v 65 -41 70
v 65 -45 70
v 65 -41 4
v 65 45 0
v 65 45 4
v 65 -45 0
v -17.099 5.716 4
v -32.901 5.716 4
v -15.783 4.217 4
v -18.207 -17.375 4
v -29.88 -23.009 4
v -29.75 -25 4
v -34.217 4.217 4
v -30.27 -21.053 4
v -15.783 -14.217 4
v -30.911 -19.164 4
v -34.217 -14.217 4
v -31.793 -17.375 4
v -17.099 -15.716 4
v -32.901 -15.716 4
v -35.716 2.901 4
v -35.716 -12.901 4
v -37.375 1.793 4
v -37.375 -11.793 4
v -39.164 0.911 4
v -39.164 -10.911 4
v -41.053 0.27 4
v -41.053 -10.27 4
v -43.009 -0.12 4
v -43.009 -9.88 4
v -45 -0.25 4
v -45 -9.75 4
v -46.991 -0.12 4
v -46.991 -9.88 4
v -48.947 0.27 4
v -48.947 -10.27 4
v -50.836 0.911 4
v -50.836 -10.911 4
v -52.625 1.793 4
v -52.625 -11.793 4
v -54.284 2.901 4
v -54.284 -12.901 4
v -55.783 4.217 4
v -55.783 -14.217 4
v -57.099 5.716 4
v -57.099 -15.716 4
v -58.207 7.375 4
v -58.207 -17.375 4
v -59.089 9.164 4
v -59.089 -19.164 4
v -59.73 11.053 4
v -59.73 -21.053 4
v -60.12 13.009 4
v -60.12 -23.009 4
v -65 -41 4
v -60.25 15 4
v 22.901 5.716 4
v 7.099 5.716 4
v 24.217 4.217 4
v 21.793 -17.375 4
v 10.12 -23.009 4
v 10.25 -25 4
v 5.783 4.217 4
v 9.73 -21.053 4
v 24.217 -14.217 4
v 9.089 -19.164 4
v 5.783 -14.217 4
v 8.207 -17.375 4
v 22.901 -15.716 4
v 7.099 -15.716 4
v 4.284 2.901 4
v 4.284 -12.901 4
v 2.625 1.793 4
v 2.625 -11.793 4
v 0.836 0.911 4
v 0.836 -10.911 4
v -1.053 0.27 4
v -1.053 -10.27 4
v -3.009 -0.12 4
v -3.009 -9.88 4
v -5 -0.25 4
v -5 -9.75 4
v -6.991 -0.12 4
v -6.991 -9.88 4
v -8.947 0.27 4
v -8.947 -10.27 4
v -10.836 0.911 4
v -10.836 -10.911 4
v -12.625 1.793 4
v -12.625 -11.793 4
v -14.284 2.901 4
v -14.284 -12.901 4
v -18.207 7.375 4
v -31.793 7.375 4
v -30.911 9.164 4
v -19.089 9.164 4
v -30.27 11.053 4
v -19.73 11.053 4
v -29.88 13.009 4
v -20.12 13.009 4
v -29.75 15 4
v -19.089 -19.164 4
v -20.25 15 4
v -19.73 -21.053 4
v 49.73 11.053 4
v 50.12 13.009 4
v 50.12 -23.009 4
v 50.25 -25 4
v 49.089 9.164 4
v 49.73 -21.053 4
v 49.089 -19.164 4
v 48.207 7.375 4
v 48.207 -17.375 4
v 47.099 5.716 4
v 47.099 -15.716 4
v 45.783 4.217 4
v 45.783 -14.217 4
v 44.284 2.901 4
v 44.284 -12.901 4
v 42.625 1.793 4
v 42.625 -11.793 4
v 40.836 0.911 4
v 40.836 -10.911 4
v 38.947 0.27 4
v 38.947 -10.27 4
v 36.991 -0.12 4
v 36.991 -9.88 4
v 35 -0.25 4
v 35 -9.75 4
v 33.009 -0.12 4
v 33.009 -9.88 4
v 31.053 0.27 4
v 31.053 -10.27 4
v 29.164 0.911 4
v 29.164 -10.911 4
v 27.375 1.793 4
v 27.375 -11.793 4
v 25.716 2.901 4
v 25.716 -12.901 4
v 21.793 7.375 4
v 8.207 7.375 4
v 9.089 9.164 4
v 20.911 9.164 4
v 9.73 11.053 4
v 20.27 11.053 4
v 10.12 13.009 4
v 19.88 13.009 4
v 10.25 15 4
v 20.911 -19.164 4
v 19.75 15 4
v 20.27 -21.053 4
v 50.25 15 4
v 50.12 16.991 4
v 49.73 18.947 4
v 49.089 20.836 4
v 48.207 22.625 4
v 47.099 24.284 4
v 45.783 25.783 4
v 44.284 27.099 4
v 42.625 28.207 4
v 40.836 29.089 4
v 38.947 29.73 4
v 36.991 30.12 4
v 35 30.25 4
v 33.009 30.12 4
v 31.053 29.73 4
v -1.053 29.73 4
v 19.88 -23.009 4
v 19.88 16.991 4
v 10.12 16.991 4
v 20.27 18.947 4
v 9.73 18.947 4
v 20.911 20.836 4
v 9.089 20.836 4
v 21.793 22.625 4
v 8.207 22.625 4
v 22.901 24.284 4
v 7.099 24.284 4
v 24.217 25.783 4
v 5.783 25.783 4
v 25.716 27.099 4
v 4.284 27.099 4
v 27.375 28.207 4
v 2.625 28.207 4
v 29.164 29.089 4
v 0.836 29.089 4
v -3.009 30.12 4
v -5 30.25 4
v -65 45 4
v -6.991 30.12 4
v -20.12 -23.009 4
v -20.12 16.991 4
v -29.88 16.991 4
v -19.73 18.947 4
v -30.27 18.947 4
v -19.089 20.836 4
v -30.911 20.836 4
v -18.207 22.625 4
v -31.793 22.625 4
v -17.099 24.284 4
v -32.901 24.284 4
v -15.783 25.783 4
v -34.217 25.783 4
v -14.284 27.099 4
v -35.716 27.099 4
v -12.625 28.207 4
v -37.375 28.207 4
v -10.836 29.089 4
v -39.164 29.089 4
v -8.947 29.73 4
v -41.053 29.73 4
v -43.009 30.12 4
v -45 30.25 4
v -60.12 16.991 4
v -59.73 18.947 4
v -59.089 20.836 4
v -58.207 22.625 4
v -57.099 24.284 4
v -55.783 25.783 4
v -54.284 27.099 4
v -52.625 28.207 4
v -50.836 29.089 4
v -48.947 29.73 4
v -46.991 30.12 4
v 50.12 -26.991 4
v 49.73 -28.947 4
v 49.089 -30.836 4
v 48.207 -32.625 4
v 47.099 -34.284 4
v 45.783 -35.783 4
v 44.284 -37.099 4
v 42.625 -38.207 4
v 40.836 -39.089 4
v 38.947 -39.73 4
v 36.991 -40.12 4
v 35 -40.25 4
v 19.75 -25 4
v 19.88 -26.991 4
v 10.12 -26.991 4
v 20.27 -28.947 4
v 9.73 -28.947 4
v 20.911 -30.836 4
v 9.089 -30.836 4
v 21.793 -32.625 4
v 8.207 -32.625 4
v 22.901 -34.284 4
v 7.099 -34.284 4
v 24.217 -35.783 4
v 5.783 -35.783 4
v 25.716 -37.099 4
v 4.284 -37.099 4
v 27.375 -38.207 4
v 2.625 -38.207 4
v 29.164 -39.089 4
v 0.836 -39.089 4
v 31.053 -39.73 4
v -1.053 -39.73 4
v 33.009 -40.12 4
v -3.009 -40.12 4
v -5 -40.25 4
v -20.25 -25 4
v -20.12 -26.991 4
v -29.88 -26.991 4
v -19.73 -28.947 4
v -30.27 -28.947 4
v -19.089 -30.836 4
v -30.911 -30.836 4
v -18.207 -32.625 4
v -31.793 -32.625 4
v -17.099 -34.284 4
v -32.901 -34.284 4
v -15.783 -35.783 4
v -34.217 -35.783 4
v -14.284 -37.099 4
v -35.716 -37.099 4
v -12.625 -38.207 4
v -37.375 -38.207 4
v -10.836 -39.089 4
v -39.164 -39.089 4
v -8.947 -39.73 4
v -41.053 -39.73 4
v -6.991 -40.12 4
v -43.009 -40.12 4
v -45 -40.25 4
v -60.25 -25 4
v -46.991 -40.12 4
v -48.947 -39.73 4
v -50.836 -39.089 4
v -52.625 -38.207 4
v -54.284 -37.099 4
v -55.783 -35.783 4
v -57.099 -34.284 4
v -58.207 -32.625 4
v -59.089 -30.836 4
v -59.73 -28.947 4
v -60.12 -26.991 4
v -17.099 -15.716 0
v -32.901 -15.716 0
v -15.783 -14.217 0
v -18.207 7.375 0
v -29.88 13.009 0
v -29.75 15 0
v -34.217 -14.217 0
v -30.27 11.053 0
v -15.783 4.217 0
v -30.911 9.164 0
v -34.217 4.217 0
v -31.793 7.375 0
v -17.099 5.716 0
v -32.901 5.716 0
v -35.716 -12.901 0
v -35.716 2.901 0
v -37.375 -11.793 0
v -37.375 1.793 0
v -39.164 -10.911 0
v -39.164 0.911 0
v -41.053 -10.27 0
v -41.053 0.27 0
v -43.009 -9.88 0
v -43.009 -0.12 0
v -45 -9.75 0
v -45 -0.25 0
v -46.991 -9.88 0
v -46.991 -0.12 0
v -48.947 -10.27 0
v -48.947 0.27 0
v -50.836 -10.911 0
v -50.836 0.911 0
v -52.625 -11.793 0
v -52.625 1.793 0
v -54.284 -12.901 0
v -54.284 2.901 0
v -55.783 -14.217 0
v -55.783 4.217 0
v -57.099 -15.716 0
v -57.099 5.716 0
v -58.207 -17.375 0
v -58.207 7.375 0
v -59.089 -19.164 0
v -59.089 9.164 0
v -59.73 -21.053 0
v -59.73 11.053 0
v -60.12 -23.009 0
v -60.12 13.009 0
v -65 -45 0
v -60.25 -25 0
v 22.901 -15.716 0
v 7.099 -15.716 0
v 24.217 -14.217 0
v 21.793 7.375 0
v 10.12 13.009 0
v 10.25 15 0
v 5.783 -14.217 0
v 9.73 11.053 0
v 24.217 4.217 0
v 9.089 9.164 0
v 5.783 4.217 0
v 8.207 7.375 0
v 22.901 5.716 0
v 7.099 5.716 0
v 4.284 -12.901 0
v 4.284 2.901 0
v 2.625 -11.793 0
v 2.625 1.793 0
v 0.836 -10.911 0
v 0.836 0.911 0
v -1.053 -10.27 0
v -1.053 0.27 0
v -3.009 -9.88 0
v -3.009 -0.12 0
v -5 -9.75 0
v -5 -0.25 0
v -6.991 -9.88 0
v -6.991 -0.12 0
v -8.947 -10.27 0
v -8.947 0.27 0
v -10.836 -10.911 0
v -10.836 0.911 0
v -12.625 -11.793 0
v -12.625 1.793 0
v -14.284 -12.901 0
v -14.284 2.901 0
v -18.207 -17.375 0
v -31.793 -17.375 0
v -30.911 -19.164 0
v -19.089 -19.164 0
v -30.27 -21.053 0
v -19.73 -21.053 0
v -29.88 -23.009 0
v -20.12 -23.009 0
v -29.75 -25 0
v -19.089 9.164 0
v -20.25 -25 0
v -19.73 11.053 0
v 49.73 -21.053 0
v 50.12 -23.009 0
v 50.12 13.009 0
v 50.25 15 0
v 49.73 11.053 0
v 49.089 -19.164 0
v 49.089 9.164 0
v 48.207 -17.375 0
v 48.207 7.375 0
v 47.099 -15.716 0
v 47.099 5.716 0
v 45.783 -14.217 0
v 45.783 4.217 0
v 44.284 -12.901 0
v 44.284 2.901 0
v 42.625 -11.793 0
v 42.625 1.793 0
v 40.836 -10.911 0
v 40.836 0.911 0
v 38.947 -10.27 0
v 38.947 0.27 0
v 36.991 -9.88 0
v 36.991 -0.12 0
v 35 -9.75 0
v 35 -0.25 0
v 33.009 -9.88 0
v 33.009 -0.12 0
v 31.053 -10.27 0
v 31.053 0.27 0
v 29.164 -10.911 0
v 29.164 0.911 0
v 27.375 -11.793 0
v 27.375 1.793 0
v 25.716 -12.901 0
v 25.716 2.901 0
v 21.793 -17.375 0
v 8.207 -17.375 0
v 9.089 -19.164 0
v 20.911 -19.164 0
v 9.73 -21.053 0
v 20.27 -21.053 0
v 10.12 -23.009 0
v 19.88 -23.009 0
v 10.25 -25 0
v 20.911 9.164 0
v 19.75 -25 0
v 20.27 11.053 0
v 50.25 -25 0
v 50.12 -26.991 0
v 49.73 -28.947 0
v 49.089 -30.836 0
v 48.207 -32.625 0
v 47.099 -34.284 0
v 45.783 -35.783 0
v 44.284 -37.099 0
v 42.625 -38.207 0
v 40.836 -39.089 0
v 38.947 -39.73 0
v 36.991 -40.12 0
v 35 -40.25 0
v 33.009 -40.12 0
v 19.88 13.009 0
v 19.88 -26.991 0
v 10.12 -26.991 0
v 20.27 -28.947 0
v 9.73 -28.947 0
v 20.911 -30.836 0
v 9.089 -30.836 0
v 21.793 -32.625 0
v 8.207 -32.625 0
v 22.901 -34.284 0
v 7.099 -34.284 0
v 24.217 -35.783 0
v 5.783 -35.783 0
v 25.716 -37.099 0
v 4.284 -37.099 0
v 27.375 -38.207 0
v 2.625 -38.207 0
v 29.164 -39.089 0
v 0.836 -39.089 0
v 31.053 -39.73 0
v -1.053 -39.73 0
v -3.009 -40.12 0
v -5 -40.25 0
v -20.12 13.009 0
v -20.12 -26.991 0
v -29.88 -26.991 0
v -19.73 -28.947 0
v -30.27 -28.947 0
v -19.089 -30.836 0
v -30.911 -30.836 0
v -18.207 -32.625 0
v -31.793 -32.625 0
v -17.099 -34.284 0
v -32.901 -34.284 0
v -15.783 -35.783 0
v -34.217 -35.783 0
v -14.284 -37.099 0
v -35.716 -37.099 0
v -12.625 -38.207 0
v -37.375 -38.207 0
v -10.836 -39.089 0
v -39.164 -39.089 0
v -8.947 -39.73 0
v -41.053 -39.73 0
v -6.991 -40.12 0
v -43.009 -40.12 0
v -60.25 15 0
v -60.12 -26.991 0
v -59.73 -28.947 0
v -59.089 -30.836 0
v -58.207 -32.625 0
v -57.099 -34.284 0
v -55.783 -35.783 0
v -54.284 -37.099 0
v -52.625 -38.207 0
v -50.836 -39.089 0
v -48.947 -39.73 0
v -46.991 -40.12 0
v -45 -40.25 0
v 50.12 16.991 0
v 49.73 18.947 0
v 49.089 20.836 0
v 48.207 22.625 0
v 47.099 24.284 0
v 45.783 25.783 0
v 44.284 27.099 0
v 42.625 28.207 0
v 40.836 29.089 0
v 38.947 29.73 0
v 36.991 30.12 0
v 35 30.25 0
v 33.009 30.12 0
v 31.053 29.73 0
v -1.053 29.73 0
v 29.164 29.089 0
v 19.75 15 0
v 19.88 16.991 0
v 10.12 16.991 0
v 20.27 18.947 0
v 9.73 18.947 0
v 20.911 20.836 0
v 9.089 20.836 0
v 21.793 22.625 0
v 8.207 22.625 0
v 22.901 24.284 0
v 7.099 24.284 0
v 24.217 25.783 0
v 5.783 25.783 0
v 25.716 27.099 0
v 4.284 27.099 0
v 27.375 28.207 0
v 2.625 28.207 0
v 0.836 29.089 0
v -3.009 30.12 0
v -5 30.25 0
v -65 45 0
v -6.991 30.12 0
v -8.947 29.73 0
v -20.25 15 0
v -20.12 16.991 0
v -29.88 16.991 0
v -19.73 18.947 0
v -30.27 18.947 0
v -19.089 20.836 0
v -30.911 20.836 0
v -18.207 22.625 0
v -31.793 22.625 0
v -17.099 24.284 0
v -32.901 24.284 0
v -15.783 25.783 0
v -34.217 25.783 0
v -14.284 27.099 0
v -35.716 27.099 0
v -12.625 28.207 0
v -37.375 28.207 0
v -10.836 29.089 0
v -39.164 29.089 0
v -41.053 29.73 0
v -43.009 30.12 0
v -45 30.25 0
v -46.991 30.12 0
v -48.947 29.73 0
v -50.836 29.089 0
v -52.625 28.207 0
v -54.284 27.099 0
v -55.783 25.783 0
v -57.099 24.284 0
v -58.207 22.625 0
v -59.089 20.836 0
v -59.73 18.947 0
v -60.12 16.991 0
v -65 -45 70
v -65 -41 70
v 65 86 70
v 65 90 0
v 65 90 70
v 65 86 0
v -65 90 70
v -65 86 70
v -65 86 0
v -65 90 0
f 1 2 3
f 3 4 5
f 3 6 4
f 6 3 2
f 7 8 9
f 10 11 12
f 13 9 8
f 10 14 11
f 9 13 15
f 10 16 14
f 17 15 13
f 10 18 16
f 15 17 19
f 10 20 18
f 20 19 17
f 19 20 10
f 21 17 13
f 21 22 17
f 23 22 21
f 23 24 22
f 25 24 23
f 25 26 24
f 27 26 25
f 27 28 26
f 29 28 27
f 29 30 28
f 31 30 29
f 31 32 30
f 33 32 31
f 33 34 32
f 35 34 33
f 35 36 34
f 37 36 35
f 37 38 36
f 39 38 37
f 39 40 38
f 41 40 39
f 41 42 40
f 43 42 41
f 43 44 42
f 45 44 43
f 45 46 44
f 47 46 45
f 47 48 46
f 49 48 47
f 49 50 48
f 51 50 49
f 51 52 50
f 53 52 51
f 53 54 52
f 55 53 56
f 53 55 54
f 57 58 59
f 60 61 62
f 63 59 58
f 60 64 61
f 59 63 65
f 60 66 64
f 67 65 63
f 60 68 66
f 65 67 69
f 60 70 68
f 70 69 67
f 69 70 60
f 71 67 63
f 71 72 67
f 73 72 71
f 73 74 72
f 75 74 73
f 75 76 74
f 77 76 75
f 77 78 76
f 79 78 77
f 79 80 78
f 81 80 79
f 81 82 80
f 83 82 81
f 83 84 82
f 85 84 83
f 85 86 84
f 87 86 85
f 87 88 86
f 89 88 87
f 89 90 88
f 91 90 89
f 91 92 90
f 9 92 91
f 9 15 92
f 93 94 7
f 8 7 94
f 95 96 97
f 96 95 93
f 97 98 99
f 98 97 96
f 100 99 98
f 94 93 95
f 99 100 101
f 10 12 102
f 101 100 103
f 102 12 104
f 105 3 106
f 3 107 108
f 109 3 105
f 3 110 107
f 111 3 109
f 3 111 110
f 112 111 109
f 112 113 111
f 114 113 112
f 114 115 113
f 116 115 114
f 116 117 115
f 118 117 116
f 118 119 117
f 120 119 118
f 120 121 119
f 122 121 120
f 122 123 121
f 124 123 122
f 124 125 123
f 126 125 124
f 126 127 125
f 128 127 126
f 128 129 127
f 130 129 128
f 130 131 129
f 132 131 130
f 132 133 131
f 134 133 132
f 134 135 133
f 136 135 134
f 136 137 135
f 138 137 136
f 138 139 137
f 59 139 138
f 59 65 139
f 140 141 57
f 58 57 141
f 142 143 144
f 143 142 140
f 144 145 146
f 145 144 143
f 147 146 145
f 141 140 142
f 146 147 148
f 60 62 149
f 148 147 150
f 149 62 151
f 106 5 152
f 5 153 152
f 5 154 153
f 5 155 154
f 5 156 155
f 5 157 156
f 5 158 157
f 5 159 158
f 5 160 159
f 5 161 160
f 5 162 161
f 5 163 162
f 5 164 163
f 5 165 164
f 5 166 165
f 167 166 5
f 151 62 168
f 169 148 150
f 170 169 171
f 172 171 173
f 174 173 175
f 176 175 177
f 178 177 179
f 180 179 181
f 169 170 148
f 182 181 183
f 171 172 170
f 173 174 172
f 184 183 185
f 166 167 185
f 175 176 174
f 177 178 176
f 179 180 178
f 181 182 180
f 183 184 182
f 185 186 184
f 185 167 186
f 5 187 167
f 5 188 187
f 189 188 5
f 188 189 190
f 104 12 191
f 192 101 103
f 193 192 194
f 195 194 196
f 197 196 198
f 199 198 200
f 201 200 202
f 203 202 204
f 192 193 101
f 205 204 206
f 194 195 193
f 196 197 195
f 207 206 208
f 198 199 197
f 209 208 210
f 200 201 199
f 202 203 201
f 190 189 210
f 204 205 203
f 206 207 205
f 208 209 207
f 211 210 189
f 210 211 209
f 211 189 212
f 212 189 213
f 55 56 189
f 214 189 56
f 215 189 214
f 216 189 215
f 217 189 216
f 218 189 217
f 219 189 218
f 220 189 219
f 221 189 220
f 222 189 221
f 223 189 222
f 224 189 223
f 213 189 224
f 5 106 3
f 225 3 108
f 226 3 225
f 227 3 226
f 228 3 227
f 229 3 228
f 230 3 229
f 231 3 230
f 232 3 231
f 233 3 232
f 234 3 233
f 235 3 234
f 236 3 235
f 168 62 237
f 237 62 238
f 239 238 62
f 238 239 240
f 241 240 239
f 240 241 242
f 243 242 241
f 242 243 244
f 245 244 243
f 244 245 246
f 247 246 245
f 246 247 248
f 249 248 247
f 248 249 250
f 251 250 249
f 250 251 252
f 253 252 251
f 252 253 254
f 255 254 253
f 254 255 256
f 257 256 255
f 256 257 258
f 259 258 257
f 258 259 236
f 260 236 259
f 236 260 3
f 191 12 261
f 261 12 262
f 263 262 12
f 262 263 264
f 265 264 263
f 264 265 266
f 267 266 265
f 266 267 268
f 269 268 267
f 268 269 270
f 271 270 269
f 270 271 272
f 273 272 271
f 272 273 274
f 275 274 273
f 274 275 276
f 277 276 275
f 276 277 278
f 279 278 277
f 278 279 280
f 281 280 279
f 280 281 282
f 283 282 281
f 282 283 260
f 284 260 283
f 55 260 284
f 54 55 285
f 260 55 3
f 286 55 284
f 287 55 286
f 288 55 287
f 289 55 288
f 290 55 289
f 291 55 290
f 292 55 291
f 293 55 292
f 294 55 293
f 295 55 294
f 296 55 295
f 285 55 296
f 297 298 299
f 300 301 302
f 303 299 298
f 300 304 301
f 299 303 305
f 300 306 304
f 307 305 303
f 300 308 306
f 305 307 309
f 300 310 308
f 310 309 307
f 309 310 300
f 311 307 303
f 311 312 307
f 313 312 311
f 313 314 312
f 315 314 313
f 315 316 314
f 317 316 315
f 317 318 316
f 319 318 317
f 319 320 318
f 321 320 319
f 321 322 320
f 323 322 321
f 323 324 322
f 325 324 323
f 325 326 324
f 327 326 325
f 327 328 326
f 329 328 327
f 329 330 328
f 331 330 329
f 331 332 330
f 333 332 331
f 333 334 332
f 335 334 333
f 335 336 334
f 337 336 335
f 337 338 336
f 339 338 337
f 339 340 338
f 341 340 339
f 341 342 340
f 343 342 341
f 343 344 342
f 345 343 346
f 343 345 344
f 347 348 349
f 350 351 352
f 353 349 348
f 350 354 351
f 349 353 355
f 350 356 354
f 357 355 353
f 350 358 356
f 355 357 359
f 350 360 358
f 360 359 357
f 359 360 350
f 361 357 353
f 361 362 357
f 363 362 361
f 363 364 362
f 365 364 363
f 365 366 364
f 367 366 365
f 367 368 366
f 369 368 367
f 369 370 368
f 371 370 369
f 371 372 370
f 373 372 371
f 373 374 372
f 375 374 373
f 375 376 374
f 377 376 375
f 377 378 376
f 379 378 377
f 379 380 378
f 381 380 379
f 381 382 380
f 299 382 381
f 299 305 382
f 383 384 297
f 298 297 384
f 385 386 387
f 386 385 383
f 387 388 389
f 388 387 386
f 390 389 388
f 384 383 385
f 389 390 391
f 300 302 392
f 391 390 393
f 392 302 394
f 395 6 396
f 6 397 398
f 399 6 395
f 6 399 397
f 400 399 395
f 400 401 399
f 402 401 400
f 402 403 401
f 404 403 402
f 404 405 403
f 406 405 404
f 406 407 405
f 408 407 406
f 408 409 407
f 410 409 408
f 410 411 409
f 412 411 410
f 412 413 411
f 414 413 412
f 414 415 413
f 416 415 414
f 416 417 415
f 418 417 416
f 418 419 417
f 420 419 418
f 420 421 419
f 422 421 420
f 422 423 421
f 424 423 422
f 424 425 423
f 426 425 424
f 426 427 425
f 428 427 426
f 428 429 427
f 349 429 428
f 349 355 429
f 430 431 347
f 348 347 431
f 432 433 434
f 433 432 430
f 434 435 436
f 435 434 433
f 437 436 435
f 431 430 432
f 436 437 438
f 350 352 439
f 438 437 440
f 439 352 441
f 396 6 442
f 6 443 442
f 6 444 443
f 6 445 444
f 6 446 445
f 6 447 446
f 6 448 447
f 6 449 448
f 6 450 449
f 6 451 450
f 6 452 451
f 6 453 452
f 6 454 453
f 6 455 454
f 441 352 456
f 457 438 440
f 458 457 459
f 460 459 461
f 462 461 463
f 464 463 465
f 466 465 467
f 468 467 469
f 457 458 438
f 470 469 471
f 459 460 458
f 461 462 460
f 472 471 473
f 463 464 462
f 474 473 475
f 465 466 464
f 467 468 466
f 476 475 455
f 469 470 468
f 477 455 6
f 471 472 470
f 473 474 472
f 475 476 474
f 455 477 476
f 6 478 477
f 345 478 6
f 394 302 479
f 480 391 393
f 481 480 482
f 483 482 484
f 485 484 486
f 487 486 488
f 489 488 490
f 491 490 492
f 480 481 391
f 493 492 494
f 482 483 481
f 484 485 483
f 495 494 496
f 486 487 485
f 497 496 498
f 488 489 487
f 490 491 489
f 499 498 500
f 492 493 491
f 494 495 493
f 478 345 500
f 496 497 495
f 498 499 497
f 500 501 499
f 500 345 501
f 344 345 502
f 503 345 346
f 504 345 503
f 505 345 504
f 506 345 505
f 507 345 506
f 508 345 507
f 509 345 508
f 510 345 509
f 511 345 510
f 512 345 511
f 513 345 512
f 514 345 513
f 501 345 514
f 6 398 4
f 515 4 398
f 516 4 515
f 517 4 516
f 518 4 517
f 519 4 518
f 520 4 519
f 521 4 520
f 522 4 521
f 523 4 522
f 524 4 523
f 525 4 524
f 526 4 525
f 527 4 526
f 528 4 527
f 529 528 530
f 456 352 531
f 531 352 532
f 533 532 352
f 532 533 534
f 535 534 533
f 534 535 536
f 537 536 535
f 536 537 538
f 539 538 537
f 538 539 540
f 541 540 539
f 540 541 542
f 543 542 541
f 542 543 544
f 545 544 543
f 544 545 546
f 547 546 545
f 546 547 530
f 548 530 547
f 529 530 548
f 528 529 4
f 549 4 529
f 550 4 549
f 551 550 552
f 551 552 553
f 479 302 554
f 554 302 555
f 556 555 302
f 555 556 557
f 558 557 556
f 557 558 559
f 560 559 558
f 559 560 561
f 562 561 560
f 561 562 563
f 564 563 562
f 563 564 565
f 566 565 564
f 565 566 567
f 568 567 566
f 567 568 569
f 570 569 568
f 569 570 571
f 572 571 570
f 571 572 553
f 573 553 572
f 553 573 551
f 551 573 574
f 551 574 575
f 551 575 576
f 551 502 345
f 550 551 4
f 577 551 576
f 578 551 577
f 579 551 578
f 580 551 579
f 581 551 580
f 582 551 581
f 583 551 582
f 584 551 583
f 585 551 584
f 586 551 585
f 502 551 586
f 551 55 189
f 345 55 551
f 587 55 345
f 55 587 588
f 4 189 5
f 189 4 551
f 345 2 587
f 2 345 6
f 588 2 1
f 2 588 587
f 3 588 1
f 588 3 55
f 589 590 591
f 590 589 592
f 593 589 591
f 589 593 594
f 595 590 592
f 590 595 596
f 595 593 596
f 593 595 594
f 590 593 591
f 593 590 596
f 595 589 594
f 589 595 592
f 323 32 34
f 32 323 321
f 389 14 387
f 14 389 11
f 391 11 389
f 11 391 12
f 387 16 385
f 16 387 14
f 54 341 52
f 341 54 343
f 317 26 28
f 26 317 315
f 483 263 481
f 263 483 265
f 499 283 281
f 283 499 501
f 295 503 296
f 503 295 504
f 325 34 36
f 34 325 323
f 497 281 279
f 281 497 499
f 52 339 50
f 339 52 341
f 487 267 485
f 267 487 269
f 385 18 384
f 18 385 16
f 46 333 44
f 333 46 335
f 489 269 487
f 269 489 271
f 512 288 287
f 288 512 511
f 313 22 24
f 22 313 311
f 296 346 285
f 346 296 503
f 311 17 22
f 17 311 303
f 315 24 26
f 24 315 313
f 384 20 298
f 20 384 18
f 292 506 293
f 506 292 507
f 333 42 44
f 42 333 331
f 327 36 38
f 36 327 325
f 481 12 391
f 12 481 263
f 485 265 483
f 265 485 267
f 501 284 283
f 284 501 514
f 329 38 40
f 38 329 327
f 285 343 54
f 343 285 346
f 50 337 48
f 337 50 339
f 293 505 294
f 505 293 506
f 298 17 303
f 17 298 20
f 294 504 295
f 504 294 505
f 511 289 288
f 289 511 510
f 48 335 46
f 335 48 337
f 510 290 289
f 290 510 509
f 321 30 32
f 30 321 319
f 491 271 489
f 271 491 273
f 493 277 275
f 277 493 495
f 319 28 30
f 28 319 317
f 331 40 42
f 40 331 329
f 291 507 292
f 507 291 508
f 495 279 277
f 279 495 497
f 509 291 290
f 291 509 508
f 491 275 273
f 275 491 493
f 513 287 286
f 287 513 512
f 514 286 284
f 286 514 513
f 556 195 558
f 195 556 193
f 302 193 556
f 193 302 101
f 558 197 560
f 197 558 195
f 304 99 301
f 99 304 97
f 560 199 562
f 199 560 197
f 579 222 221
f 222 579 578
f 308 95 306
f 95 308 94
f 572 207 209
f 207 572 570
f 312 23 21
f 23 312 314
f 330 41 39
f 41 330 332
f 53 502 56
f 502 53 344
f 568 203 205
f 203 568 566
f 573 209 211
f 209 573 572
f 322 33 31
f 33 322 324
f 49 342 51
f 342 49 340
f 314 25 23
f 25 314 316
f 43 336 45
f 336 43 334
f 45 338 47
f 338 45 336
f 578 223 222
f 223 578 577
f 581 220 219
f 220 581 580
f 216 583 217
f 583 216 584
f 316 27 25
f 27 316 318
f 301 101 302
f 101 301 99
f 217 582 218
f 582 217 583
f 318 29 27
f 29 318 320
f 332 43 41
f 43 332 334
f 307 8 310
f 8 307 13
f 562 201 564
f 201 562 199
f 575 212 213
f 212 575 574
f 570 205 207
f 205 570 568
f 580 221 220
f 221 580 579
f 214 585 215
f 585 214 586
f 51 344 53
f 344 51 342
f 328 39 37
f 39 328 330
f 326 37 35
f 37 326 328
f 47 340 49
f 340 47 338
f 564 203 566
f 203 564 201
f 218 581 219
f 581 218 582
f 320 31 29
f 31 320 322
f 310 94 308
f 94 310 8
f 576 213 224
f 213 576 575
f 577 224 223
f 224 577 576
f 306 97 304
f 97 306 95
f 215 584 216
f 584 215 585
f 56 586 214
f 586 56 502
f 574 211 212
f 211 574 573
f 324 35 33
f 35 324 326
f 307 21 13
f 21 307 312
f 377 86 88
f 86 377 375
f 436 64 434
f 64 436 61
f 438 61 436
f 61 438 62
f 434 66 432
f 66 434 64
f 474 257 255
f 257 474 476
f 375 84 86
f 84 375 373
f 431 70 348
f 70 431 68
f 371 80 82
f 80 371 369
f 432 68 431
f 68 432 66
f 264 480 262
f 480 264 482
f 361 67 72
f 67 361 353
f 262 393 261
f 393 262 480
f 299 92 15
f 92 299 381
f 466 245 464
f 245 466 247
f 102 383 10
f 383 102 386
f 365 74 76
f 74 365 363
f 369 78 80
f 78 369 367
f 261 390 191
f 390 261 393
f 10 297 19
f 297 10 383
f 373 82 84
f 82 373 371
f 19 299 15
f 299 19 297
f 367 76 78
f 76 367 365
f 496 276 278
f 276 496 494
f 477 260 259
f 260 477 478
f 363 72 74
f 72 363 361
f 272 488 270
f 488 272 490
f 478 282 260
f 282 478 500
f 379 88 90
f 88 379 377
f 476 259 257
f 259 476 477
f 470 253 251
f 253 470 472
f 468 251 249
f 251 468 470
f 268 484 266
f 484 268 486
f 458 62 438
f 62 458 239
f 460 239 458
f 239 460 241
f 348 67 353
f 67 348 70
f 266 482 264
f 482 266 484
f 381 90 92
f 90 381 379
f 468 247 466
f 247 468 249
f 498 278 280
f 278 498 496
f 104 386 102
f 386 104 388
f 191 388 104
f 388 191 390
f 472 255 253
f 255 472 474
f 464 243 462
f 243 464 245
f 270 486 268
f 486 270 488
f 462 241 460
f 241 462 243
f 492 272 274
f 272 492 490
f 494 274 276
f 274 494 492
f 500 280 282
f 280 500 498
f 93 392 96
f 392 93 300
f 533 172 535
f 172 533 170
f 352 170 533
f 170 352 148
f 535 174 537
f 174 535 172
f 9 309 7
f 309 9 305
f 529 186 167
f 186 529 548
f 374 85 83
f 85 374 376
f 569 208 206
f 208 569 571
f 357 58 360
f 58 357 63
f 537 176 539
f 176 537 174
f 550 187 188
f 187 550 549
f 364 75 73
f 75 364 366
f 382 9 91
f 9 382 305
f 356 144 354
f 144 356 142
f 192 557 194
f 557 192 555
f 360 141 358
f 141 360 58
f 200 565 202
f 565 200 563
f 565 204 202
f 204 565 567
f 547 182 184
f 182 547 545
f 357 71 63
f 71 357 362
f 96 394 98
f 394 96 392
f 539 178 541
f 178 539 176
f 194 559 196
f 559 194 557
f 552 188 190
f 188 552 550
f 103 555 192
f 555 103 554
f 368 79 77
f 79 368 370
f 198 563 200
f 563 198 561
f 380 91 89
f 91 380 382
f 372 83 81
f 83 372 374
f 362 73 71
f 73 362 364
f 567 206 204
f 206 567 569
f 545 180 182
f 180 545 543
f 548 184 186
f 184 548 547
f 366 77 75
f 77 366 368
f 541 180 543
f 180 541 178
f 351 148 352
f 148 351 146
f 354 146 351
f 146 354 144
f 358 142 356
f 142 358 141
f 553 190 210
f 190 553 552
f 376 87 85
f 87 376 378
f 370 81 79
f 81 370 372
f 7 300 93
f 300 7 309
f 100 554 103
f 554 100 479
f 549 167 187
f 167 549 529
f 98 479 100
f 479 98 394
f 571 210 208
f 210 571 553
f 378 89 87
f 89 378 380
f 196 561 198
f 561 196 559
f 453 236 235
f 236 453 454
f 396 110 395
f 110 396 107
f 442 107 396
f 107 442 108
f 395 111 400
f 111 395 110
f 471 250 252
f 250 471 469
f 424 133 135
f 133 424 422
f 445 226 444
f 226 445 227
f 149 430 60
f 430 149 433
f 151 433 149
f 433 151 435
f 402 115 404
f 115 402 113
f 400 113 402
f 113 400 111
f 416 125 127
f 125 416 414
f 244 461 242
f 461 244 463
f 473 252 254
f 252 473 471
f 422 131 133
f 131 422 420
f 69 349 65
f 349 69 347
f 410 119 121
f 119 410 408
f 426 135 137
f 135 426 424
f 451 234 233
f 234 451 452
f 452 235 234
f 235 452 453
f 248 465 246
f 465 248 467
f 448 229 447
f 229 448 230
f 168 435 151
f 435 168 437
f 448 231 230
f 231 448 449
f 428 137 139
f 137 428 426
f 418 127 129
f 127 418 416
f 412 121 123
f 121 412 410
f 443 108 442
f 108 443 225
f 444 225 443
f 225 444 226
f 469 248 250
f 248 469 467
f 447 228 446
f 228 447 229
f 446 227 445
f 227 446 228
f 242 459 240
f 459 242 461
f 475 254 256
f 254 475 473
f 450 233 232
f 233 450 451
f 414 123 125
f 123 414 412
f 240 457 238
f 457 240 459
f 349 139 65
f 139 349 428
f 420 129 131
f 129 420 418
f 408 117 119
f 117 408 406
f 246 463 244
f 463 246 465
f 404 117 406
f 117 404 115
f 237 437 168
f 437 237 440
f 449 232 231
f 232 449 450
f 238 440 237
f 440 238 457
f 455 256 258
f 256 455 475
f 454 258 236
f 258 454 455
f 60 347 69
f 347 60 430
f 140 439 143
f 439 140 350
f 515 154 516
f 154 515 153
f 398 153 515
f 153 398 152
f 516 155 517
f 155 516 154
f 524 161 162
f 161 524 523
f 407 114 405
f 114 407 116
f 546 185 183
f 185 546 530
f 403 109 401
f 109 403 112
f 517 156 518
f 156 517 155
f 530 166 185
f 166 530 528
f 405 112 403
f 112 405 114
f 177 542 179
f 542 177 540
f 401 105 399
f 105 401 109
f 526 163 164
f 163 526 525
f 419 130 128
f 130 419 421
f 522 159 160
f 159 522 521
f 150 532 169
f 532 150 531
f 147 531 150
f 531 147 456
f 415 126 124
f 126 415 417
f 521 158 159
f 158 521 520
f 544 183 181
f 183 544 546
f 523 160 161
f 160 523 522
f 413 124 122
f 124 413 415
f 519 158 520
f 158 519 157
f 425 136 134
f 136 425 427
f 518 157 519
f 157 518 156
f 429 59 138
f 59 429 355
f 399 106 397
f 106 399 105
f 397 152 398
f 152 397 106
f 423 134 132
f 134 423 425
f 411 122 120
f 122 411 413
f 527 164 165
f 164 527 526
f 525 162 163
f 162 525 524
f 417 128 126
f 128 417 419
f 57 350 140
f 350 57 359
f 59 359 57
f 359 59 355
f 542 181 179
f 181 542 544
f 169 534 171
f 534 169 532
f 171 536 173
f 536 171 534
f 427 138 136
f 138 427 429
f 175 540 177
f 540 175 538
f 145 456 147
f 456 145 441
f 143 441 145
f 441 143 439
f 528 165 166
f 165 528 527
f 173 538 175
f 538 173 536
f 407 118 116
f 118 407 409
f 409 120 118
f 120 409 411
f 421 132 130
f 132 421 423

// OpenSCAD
// Tube rack for six 50 mL conical (Falcon-type) tubes - printed upside down and flipped over.
// A flat plate with a 2x3 hole grid and two solid walls run along the long edges. The two
// short ends are open. The walls and plate form a U-cross section along X. NOVEL general part.
//

cols   = 3;
rows   = 2;
tube_d = 30.5;
pitch_x = 40;
pitch_y = 40;
plate_w = 130;
plate_h = 90;
plate_t = 4;
wall_h = 70;

$fn = 48;

plate_n = cols * rows;

difference() {
    union() {
        translate([-plate_w / 2, -plate_h / 2, 0]) cube([plate_w, plate_h, plate_t]);
        translate([-plate_w / 2, -plate_h / 2, 0]) cube([plate_w, 4, wall_h]);      // left wall
        translate([-plate_w / 2, plate_h - 4, 0]) cube([plate_w, 4, wall_h]);      // right wall
    }
    for (i = [0 : cols - 1], j = [0 : rows - 1])
        translate([
            -plate_w / 2 + pitch_x / 2 + i * pitch_x,
            -plate_h / 2 + pitch_y / 2 + j * pitch_y,
            -1
        ]) cylinder(h = plate_t + 2, d = tube_d);
}
